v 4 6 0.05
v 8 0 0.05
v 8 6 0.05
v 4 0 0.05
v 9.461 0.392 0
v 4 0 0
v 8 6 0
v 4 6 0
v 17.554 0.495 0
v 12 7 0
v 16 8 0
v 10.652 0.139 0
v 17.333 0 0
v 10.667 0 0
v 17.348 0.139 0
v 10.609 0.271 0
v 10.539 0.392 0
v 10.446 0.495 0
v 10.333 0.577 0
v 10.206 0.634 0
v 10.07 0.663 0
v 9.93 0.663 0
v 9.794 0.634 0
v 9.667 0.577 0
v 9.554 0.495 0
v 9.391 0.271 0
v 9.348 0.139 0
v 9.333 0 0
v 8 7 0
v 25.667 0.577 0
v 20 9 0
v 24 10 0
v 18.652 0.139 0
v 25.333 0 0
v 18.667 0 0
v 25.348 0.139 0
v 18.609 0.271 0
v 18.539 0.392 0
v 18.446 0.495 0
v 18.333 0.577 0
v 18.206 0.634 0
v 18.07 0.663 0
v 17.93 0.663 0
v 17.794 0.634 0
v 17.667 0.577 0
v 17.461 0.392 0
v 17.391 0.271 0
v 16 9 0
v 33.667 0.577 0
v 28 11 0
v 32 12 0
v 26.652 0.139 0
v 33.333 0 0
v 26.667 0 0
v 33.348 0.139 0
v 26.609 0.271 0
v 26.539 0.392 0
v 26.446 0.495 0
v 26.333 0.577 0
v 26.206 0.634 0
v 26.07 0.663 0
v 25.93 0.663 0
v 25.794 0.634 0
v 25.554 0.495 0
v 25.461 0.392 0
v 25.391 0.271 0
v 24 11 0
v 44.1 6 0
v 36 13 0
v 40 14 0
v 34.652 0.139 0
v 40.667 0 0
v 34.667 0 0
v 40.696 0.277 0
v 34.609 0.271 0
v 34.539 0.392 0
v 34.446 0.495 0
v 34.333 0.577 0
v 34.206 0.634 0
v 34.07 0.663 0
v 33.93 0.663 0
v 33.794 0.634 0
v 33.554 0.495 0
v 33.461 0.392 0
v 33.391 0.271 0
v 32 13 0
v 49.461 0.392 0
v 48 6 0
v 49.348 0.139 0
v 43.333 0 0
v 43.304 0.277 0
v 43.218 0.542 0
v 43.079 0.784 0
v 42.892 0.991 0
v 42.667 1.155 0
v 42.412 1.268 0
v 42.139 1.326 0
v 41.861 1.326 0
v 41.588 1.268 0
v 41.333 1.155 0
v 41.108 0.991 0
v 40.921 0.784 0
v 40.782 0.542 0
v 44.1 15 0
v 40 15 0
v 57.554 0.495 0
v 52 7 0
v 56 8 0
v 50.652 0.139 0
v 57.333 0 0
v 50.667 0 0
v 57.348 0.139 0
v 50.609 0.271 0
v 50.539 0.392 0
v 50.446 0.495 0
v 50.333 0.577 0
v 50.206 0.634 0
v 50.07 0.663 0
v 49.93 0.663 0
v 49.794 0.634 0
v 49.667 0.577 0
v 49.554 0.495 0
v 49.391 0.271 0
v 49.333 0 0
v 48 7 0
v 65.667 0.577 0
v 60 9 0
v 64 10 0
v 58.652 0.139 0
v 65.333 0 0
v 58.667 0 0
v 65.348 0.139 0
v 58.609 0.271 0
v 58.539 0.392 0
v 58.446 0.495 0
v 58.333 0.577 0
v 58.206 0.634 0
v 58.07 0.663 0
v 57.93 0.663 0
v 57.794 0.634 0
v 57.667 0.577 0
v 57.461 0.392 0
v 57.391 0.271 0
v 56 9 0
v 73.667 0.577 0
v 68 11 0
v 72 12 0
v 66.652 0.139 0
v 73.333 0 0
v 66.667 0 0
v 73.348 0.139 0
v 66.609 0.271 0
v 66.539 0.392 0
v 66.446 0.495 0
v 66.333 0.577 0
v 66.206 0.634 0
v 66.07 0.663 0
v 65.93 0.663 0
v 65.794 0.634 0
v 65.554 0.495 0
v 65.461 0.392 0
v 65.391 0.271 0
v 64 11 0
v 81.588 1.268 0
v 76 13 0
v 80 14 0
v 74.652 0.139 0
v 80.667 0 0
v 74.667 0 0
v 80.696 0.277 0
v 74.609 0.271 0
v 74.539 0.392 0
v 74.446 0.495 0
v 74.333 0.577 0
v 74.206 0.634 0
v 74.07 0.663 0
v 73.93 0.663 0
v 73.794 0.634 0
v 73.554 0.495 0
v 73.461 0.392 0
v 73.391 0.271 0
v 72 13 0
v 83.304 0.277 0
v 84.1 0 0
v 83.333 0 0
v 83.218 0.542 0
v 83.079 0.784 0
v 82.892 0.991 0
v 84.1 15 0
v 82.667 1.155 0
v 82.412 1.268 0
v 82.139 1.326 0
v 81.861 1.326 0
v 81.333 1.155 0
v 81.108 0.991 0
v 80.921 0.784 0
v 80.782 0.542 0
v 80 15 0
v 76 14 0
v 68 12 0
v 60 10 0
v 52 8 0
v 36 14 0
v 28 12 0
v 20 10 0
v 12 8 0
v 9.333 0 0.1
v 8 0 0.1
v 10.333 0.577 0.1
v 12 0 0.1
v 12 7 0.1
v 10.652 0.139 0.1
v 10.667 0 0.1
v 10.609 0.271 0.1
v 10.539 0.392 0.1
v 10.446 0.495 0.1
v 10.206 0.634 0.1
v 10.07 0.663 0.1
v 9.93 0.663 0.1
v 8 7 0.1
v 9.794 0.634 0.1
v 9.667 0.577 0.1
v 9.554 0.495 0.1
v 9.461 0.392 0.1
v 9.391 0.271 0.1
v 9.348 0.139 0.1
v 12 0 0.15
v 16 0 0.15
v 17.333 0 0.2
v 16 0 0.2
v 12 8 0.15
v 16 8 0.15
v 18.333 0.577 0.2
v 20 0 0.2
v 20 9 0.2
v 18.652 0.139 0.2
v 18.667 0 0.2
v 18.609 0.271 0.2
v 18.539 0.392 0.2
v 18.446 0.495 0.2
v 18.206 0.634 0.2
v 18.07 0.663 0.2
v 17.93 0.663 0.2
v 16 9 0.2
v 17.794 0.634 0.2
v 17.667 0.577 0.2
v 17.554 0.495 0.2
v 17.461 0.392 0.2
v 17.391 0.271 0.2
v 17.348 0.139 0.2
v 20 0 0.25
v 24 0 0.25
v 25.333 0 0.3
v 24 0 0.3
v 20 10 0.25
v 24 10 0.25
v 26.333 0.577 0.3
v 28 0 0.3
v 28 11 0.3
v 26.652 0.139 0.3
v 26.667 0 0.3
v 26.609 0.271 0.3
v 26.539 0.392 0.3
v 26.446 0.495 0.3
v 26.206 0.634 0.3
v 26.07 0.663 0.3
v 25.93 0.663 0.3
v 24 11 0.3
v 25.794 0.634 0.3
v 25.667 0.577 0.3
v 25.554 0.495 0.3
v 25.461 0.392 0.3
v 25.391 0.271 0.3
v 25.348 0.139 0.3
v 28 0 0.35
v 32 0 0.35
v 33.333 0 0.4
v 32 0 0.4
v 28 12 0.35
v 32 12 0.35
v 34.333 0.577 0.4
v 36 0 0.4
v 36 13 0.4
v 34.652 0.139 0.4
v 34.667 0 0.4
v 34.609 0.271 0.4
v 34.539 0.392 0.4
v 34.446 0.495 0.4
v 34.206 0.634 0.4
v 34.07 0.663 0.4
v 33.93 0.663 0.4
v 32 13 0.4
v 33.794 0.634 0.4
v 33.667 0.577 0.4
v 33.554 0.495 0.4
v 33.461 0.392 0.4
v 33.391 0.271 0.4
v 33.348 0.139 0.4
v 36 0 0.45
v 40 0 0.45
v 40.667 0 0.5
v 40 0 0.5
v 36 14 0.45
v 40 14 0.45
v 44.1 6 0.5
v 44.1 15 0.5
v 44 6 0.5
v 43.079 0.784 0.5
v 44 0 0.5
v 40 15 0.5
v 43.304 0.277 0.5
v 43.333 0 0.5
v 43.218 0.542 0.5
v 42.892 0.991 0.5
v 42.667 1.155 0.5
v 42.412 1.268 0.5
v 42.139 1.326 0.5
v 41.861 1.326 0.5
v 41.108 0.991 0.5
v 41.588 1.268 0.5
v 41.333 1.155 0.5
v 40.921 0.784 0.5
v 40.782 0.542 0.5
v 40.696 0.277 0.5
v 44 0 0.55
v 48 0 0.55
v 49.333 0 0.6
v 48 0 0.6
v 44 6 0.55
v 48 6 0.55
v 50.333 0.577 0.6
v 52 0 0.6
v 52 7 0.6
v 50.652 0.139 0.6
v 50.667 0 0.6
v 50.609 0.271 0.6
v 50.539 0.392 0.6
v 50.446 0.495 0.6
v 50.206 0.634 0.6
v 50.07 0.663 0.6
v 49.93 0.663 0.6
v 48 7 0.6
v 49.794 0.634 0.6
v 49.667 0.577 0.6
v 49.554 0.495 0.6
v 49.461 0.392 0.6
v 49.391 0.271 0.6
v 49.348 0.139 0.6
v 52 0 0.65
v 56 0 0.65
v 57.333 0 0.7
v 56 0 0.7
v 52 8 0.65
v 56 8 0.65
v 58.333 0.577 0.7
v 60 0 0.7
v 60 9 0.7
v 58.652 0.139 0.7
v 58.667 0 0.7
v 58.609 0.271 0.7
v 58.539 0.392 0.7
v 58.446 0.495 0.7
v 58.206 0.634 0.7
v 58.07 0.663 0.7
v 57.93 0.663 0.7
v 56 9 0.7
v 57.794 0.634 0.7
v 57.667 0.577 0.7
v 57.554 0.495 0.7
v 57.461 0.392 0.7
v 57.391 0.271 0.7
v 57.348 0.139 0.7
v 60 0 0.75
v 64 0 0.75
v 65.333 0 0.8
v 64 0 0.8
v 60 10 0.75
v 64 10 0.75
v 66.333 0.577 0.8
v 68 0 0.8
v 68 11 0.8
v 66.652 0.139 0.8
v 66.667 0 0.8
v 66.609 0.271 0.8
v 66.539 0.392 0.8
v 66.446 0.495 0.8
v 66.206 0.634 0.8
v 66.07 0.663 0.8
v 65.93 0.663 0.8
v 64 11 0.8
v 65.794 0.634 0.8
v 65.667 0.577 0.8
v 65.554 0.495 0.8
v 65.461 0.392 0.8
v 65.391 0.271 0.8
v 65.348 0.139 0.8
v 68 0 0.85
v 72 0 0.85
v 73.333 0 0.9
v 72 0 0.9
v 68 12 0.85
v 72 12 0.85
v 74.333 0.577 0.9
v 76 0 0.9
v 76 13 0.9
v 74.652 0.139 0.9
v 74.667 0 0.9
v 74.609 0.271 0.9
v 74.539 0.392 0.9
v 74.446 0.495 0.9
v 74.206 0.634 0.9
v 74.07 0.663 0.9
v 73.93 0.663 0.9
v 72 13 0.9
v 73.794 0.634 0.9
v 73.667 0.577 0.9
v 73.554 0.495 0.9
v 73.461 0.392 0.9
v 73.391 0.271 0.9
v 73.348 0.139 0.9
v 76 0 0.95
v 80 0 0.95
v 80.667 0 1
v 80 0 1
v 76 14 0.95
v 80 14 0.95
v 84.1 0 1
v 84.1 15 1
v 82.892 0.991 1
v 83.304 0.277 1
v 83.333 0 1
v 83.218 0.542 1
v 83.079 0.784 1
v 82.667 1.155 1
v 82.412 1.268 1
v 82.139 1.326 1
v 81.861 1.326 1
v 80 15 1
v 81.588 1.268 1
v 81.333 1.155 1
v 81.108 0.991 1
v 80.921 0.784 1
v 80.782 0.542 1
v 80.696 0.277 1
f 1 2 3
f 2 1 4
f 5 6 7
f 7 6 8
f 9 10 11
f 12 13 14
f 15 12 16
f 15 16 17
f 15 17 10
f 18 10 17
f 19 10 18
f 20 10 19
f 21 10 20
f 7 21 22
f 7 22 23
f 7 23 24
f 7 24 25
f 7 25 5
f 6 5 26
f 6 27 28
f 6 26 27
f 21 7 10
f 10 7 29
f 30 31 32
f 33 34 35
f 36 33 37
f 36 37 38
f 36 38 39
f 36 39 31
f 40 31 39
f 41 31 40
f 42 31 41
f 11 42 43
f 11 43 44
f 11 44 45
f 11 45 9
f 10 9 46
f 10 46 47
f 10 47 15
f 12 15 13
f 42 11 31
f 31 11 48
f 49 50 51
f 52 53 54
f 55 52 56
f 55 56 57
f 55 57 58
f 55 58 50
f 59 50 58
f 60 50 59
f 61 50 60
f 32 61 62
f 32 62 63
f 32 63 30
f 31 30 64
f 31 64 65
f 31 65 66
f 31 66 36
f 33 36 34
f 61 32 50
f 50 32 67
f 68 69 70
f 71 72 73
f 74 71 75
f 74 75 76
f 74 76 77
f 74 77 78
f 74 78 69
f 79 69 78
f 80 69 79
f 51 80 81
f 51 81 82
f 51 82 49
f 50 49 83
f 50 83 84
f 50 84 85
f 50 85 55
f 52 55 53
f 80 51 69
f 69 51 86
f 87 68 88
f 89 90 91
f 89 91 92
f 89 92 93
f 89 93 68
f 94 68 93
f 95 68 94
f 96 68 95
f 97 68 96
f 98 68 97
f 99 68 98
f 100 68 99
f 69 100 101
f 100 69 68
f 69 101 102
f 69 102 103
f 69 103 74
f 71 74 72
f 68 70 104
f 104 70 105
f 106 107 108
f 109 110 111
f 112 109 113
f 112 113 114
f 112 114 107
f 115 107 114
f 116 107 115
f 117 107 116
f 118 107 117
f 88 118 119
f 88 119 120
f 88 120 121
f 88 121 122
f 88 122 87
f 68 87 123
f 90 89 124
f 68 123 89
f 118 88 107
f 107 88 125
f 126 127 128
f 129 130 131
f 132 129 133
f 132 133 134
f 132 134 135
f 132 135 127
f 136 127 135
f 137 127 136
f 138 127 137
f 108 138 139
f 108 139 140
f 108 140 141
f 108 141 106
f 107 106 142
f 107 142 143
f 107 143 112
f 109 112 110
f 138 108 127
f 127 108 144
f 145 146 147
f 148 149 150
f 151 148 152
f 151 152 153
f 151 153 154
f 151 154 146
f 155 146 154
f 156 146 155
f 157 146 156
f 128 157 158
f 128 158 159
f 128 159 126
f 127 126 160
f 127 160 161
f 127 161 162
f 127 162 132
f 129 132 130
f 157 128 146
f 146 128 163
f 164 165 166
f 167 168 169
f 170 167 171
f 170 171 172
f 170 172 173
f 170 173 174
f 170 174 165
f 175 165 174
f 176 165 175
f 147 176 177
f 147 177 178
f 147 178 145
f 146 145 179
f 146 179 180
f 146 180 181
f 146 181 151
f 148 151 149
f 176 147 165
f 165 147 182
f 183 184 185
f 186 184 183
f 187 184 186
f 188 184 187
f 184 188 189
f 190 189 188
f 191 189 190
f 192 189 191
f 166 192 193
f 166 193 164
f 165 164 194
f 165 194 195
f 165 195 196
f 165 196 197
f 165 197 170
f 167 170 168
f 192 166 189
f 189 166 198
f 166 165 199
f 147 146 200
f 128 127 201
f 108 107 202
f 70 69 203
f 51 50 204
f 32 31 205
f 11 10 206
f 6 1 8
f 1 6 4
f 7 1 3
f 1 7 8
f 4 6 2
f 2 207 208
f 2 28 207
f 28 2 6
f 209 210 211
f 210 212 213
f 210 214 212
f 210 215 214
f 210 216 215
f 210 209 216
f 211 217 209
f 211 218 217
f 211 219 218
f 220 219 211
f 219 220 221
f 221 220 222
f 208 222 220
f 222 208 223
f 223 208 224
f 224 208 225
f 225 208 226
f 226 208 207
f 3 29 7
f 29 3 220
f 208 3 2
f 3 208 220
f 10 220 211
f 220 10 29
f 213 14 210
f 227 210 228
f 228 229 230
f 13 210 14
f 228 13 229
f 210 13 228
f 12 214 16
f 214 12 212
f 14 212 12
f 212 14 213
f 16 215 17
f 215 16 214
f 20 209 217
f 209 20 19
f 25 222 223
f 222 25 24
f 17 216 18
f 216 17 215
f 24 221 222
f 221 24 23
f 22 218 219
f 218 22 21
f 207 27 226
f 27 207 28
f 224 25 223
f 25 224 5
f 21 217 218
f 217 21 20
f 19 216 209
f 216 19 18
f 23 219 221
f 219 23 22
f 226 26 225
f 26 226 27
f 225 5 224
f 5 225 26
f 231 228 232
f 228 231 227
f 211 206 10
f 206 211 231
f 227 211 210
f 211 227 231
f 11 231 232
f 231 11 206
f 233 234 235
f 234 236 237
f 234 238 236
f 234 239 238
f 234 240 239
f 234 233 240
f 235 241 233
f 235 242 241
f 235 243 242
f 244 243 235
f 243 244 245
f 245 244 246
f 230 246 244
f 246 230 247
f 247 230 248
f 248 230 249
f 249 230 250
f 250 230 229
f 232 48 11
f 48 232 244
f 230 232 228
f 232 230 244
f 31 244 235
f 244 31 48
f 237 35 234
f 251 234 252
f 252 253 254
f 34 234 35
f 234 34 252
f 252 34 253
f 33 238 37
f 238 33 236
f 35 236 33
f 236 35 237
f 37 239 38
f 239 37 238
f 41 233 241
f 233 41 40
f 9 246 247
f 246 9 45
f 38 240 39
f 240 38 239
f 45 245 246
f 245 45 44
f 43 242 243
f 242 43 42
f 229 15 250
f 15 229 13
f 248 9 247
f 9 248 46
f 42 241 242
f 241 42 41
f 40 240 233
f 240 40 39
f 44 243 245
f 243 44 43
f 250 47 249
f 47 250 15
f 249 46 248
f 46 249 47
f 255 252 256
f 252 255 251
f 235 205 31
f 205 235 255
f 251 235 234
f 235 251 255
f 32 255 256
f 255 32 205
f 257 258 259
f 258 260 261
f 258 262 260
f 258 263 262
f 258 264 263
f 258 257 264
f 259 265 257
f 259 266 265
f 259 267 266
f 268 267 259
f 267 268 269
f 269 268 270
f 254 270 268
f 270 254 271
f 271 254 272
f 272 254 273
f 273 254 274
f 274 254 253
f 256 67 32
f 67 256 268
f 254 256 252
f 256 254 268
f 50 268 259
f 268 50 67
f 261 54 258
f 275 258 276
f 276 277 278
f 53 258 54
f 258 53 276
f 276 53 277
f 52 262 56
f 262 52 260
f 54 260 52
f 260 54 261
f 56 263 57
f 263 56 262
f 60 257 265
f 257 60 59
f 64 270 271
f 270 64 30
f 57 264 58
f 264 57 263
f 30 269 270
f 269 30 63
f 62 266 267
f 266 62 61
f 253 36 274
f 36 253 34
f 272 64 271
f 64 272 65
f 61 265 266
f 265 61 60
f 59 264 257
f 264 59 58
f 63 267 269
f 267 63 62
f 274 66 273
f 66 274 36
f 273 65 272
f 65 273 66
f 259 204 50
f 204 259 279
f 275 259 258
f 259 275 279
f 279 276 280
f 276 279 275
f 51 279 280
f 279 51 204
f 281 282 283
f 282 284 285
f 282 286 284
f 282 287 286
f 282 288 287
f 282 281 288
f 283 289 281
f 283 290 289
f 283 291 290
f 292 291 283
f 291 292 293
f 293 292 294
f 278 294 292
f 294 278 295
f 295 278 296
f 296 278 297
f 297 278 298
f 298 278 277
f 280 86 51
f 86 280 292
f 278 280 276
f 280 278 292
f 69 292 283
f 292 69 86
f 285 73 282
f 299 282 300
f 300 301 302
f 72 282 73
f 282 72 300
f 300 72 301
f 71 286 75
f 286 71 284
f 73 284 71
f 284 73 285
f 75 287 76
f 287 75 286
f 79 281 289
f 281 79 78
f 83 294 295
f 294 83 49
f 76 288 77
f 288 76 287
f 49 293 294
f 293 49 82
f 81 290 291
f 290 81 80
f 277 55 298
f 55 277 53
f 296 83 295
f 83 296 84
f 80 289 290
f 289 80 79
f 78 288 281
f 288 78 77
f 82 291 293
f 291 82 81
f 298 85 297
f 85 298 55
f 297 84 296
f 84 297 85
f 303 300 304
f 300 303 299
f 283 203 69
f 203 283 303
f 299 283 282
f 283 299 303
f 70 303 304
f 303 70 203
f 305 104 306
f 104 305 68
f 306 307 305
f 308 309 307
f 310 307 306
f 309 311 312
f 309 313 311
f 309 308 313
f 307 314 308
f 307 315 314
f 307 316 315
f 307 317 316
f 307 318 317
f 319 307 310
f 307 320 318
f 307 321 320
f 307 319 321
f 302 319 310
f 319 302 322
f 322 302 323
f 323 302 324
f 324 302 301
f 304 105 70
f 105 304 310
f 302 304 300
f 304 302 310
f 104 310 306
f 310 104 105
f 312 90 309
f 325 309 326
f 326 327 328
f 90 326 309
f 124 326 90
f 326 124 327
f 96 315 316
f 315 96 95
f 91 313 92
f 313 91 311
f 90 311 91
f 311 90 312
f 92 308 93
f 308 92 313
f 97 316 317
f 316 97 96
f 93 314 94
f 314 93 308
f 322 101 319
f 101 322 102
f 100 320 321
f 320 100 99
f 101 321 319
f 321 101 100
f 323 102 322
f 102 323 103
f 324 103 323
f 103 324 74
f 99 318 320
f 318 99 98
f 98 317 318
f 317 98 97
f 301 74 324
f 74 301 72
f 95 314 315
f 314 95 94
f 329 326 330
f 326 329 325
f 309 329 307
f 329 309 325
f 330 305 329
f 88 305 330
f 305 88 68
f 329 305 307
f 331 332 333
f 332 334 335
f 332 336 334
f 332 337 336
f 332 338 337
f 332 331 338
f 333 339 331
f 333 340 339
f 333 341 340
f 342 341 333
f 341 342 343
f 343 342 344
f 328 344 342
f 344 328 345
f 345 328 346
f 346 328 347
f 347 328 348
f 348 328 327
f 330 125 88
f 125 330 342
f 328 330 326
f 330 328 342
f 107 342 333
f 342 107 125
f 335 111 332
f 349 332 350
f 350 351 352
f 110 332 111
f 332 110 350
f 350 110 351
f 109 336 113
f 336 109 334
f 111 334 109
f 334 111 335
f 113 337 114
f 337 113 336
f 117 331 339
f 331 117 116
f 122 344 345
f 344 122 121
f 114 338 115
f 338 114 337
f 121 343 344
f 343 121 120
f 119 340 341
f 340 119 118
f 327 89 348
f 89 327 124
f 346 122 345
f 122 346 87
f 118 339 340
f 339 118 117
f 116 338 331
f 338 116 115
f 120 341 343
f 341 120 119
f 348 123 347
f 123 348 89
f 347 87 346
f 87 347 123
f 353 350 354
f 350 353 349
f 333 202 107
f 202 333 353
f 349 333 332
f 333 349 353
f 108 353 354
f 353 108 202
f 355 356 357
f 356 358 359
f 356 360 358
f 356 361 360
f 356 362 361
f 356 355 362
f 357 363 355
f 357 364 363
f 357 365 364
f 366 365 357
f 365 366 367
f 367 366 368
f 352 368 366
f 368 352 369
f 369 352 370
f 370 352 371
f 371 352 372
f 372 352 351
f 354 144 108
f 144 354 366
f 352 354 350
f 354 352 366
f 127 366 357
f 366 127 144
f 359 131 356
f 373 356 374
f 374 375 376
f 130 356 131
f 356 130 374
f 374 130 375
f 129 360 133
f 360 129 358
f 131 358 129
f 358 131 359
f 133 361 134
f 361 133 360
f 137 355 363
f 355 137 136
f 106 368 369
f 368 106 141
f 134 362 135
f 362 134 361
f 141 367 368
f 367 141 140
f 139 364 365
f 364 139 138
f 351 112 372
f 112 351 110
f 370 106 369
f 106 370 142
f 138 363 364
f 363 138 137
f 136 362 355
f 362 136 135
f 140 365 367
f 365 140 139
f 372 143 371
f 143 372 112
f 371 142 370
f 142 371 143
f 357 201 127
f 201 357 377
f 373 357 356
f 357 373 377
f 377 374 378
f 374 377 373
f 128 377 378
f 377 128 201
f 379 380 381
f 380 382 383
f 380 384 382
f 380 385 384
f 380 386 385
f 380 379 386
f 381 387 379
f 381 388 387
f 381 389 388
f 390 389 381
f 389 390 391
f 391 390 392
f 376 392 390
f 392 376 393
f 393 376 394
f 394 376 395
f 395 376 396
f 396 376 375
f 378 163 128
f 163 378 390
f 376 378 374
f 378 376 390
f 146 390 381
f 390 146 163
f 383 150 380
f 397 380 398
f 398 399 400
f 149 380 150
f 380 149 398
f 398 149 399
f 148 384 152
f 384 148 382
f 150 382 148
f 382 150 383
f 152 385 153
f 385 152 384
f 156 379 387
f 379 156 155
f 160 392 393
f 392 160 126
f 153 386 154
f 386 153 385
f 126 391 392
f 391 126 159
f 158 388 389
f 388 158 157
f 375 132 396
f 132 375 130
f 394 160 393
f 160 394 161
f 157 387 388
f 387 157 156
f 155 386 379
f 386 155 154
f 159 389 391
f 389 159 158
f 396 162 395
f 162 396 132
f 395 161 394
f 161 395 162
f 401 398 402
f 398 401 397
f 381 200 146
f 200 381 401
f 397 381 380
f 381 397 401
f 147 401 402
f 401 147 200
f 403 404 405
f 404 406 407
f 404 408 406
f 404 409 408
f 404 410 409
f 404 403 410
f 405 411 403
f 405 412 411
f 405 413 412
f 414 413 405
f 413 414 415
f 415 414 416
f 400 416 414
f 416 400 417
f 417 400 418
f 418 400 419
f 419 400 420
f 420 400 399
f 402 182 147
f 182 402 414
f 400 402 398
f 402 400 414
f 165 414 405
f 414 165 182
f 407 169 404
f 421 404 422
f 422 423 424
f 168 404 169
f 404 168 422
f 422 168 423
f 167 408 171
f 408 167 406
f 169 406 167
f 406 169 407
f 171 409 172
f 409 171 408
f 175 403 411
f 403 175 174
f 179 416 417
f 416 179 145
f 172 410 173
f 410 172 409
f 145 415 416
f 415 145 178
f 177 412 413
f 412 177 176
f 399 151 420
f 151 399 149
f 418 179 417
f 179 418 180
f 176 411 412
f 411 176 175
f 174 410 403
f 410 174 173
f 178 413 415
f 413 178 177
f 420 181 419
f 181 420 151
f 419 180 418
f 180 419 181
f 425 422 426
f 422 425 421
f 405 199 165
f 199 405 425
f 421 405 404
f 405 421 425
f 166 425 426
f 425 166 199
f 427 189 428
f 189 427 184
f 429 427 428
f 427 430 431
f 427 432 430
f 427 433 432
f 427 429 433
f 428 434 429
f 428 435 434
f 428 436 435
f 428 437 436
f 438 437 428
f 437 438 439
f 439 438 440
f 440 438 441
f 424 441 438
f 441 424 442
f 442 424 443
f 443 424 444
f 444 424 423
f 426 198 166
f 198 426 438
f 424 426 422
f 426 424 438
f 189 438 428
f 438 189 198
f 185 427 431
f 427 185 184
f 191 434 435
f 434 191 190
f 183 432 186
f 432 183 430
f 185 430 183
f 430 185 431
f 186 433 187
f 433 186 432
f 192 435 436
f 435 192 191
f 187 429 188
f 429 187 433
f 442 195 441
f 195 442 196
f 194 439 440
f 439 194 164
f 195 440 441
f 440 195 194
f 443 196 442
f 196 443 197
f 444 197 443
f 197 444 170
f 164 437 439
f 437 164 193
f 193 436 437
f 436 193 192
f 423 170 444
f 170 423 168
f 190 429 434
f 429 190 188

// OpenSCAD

// start thickness
_1_start = 0.0;

// thickness increment between samples
_2_increment = 0.05;

// end thickness
_3_end = 1;

// width of each sample
_4_width = 4; // [1:10]

// minimum height of each sample (varies from 
_5_height = 6; // [1:50]


////////////////////////////////////////////////////////////


module layerTest(start, increment, end, width, length) {
	count = round((end-start)/increment)+1;
	radius = width/3;
	eps = 0.1;
	union() {
		for (index = [0:count-1]) {
			assign (h = start + increment * index) {
				echo(h);
				if (h > 0) {
					translate([index * width,0,0]) {
						difference() {
							cube(size=[width+eps, length + (index-1)%10, h]);

							if (index%10 == 0) {
								translate([width/2,0,0]) {
									cylinder(r=radius, h=end*3, center=true, $fn=30);
								}
							} else if (index%2 == 0) {
								translate([width/2,0,0]) {
									cylinder(r=radius/2, h=end*3, center=true, $fn=30);
								}
							}
						}
					}
				}
			}
		}
	}

}

layerTest(_1_start,_2_increment,_3_end,_4_width,_5_height);
